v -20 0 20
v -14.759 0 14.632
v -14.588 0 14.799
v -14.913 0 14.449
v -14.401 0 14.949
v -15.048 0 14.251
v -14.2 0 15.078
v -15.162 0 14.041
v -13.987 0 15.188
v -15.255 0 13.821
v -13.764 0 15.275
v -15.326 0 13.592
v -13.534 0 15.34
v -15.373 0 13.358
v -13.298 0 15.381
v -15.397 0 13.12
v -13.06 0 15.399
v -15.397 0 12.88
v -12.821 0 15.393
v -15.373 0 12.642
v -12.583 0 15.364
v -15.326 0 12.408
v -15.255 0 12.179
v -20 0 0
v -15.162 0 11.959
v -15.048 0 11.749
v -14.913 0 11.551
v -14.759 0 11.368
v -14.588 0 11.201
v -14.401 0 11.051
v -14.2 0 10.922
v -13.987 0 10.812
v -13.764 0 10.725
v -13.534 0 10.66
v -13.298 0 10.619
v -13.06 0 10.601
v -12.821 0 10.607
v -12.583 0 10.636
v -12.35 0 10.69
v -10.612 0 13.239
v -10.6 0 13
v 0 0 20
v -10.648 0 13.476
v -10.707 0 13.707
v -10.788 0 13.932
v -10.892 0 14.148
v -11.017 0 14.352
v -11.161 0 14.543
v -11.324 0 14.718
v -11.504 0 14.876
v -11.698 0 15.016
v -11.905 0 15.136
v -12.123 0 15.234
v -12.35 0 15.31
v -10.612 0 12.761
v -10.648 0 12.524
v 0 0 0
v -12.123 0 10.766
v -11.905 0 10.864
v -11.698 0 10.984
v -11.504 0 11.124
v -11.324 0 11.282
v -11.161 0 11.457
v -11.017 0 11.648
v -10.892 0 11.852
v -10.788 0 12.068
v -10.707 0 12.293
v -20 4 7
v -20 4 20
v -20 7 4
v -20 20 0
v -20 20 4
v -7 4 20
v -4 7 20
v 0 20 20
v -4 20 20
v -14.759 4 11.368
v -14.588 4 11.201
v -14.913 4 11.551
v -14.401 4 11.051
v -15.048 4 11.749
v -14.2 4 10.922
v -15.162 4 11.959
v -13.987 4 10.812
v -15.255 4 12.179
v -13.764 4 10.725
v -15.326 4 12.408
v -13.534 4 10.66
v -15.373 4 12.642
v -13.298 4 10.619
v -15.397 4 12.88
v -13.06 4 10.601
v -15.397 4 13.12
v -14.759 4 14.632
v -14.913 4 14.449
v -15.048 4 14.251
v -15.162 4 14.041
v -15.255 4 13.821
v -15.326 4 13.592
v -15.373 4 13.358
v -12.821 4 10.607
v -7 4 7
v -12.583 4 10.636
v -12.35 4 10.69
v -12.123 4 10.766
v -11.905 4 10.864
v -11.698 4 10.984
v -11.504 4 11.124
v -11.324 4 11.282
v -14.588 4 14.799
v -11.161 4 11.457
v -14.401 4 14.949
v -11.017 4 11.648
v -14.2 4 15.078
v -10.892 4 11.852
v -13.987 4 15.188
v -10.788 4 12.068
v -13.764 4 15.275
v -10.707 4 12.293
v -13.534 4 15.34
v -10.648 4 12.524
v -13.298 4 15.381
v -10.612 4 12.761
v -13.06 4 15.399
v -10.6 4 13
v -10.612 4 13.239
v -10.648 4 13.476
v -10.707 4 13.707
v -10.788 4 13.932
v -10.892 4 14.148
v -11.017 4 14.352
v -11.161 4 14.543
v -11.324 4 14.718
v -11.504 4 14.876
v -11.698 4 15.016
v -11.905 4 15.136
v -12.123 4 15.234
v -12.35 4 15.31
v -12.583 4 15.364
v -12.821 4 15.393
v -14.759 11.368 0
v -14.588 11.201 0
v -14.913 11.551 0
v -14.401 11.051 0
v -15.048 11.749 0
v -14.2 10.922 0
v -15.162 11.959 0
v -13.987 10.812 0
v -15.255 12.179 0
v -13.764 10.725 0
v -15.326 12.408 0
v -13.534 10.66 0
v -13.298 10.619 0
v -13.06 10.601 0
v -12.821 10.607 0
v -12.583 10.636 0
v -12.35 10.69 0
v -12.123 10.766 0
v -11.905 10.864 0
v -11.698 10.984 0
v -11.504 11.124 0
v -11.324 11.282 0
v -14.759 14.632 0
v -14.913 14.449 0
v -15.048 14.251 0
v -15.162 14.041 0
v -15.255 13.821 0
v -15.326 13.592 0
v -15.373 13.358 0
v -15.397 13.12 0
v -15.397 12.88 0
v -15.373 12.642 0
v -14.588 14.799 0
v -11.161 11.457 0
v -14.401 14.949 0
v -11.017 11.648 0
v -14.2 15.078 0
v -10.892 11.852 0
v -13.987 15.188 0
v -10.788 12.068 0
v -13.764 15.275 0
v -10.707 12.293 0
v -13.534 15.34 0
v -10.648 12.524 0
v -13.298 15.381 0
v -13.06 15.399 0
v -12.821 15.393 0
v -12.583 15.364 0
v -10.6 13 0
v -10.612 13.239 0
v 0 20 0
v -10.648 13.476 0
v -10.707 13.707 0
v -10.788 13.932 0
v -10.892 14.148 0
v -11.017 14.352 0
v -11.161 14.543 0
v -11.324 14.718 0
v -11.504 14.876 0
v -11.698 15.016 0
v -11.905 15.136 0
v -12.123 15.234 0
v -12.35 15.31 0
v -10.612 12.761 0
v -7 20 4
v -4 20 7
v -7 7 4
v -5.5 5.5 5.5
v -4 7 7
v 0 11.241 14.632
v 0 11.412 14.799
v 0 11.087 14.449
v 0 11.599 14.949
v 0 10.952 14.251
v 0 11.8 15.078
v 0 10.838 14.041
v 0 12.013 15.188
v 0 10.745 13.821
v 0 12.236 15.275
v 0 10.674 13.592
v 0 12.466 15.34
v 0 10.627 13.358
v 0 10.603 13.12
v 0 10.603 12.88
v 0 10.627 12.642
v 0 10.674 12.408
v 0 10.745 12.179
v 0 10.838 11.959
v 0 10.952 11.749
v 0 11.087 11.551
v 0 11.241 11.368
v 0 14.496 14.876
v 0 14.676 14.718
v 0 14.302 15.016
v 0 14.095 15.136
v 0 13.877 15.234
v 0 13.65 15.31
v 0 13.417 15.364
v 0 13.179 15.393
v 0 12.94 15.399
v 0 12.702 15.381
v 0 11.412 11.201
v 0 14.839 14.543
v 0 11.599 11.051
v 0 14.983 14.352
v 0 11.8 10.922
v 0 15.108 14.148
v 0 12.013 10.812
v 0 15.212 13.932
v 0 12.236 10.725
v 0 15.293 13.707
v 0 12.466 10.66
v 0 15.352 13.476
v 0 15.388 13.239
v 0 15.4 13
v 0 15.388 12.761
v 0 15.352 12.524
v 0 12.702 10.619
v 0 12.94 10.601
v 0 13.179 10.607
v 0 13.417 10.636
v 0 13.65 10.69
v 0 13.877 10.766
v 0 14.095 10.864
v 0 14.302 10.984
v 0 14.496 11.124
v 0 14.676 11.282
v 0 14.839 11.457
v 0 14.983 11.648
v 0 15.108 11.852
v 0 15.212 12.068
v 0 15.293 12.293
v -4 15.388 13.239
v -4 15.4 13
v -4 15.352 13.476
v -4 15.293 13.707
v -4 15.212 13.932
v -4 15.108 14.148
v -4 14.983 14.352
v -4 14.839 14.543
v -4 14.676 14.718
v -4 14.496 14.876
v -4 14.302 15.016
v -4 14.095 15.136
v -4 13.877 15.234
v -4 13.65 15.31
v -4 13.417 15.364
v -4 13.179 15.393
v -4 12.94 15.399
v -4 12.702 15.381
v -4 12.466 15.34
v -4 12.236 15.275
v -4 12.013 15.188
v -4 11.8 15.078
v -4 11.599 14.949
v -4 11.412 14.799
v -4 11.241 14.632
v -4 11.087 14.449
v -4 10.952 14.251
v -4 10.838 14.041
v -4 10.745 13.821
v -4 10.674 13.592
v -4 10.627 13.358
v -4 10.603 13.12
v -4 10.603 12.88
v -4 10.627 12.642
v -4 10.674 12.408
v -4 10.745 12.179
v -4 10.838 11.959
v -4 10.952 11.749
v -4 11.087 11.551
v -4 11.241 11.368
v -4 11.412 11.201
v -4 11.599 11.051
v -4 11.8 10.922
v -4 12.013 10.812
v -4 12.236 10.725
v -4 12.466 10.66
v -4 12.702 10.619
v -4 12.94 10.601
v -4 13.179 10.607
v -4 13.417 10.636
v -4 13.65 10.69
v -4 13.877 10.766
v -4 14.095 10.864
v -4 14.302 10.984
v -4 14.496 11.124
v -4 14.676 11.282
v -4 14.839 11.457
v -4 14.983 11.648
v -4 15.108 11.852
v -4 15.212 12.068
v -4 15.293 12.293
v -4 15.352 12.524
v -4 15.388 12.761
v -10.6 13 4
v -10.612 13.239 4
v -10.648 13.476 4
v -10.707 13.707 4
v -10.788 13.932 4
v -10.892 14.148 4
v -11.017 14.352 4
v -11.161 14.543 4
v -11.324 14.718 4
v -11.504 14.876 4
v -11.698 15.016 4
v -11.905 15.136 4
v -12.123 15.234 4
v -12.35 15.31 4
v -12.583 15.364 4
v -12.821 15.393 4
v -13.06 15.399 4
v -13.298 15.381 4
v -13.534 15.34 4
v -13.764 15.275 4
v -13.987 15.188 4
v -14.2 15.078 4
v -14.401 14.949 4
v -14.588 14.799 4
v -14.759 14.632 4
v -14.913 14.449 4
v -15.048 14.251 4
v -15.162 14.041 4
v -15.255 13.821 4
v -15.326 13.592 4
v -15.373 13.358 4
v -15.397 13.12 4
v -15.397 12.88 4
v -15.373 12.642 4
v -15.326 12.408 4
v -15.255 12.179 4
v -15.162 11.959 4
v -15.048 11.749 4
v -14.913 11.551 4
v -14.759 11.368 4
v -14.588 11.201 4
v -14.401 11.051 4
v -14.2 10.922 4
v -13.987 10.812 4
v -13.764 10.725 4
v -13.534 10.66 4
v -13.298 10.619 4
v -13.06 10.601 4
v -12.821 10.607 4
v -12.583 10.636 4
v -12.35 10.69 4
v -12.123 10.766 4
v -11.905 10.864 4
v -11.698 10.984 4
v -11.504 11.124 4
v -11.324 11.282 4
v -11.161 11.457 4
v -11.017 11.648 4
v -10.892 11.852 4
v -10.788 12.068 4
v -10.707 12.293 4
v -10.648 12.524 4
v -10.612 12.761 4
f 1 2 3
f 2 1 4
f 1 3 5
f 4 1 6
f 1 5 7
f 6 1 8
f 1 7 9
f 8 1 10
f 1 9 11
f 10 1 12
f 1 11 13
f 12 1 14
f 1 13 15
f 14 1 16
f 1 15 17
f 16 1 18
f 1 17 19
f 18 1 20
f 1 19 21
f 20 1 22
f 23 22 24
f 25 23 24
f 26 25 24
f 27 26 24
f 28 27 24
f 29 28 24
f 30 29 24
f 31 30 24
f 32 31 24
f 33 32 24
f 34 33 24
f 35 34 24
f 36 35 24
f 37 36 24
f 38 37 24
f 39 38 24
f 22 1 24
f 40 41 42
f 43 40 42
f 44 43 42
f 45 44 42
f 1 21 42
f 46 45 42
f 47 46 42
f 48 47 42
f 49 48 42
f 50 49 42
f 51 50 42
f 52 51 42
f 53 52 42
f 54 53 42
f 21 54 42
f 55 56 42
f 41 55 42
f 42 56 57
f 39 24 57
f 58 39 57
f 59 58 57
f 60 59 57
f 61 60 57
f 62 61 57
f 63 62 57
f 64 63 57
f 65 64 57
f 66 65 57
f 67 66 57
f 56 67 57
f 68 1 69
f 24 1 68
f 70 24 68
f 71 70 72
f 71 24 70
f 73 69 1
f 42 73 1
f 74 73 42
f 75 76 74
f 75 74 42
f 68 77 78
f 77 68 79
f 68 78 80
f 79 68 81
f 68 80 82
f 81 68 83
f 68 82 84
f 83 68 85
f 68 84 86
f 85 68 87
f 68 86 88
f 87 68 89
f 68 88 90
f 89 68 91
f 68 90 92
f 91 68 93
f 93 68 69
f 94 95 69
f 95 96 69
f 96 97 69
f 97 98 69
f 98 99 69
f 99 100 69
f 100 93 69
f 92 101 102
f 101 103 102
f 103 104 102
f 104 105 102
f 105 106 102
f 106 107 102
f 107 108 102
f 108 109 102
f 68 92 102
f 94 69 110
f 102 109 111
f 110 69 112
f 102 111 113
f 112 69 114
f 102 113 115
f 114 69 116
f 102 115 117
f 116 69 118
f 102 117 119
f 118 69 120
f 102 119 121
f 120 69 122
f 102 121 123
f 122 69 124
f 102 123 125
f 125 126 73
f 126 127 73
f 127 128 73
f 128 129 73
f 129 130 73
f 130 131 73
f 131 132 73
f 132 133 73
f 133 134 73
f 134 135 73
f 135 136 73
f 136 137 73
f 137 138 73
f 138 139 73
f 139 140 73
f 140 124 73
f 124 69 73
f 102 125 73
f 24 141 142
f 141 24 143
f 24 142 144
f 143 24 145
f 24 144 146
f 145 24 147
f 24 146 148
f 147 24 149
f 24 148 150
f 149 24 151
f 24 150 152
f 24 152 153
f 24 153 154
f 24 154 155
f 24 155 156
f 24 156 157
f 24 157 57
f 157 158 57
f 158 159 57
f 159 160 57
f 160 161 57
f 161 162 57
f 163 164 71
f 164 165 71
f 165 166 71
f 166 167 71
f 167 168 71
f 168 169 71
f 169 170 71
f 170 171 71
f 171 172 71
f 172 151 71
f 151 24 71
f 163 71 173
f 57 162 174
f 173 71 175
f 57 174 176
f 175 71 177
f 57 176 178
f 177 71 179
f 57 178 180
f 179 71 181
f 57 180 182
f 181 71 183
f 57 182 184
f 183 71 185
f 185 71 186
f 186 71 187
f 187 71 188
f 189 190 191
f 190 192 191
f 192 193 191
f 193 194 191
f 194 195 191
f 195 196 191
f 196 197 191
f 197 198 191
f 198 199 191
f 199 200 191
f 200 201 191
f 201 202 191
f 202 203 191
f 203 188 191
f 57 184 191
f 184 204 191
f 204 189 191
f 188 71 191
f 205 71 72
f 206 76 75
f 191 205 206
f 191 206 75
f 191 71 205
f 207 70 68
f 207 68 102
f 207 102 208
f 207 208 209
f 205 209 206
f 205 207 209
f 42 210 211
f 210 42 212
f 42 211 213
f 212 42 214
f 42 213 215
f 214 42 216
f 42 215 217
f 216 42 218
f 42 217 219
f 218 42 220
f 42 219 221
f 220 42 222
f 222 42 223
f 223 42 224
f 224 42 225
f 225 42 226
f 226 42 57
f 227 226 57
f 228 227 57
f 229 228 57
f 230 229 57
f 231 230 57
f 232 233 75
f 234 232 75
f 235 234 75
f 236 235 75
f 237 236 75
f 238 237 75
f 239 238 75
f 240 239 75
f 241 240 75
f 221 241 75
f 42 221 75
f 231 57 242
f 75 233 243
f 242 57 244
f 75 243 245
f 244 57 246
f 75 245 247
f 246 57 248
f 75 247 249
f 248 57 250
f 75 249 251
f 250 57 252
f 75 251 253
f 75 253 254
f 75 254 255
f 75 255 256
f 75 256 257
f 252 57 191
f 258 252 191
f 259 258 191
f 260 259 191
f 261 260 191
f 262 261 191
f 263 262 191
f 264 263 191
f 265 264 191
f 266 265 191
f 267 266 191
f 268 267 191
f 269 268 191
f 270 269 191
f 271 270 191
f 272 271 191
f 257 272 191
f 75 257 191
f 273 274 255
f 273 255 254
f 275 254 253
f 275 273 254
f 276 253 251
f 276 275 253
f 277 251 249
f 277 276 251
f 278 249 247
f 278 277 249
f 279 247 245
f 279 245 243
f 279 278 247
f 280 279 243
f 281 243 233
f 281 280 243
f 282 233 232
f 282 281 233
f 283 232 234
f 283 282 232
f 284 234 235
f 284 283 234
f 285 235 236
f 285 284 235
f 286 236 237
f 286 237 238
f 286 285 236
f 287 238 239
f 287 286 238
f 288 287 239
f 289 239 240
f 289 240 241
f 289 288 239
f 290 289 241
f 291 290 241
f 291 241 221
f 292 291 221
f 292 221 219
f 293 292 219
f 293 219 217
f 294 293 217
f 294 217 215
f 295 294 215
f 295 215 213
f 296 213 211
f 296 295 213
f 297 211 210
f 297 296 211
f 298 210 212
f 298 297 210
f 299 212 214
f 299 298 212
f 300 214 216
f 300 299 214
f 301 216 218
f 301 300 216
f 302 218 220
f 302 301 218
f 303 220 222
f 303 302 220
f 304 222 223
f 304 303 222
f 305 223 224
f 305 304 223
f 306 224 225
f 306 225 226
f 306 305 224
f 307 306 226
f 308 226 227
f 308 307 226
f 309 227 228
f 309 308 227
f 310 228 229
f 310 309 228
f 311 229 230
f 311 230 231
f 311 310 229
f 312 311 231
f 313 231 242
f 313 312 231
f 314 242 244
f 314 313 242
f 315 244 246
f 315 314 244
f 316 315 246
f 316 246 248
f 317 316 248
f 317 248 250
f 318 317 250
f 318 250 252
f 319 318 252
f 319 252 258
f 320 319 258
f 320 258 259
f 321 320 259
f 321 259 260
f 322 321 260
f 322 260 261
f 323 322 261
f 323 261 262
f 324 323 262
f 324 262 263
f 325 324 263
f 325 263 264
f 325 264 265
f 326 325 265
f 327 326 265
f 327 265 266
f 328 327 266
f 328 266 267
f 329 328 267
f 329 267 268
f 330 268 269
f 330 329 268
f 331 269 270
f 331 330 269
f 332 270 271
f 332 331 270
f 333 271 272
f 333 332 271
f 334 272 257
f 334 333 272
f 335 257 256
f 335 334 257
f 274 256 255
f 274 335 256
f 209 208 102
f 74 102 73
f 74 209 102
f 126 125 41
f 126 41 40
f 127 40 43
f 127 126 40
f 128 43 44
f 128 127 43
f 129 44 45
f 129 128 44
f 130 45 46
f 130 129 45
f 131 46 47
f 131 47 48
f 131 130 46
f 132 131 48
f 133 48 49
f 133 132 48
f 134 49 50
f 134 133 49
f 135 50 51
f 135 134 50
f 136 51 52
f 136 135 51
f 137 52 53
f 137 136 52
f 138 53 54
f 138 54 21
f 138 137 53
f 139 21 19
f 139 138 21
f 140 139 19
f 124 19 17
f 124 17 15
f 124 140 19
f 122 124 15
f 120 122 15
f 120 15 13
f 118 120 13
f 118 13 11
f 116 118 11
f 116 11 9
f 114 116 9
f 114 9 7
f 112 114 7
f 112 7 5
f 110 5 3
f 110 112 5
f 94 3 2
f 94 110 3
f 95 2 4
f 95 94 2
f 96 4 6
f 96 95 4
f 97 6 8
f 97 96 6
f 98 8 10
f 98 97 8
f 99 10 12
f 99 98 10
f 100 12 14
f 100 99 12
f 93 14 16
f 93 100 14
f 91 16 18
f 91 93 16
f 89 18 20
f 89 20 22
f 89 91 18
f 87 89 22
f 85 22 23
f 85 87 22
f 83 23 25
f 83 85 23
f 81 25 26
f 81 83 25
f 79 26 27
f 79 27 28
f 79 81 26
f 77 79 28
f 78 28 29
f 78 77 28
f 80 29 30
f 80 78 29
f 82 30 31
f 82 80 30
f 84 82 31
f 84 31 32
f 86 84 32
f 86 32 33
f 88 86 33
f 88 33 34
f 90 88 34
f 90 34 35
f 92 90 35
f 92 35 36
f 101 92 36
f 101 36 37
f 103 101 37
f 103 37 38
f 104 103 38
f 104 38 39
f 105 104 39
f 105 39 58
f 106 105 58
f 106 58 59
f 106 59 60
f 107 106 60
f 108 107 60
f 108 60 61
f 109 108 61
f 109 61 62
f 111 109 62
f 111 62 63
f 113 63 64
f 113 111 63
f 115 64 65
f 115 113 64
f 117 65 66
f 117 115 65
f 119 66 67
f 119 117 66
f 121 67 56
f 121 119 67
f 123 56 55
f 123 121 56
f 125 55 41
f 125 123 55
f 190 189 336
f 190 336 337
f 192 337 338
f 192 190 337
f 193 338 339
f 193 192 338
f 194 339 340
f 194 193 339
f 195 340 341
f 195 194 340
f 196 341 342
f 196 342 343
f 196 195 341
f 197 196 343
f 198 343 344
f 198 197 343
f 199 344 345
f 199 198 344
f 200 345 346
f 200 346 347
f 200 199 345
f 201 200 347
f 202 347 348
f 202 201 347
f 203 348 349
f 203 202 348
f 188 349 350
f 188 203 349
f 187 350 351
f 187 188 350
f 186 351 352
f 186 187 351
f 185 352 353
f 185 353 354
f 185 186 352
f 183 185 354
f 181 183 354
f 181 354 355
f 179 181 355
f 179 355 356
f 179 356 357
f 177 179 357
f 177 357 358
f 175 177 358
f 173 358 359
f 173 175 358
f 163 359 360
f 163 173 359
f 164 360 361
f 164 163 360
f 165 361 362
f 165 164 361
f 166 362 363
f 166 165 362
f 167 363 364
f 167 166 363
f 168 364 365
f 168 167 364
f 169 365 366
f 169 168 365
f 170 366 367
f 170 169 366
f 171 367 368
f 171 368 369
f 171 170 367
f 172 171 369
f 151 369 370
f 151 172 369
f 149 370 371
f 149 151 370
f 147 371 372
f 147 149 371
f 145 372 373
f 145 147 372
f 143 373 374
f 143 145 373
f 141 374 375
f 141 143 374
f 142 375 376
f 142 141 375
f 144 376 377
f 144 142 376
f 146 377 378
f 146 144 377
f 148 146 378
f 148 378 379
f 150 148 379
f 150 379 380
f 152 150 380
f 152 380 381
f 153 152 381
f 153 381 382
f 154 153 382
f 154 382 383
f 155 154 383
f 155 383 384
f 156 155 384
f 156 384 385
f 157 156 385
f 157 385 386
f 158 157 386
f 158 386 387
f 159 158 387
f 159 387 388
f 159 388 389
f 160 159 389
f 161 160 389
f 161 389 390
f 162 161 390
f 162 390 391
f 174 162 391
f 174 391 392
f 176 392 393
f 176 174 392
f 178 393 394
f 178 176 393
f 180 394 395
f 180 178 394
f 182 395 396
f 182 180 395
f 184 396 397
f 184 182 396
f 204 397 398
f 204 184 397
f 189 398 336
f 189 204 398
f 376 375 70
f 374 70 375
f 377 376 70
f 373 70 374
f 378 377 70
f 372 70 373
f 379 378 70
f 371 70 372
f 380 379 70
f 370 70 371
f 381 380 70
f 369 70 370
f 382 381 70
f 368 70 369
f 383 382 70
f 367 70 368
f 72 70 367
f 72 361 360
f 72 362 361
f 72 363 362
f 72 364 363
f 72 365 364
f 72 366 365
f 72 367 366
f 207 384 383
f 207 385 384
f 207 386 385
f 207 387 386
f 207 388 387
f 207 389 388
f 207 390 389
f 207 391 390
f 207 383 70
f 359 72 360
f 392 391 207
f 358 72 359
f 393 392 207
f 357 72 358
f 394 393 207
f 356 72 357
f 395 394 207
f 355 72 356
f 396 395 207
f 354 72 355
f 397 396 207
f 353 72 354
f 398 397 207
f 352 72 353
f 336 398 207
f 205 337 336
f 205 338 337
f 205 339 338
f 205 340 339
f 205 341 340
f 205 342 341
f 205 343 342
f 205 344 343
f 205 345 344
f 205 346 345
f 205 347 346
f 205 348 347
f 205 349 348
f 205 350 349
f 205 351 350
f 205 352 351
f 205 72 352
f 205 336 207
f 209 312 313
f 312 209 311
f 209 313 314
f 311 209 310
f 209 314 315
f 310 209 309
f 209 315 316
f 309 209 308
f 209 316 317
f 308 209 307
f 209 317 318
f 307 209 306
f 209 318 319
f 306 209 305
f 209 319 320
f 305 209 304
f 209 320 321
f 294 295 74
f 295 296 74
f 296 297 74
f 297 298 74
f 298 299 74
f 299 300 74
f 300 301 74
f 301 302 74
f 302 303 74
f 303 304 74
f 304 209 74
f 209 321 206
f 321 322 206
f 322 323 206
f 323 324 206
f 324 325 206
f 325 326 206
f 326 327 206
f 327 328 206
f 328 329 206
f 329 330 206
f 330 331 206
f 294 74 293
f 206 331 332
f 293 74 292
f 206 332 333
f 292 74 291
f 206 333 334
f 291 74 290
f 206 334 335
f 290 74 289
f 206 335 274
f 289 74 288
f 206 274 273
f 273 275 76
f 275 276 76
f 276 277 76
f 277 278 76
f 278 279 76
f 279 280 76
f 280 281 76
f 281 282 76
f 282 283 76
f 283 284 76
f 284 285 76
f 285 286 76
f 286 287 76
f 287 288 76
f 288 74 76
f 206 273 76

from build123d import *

# Parameters (mm, degrees)
SKETCH001_W     = 20
SKETCH001_H     = 20
SKETCH001_R     = 2.4
PAD001_DEPTH    = 4
SKETCH002_W     = 20
SKETCH002_H     = 20
SKETCH002_R     = 2.4
PAD002_DEPTH    = 4
SKETCH_W        = 20
SKETCH_H        = 20
SKETCH_R        = 2.4
PAD_DEPTH       = 4
CHAMFER_SIZE    = 3
CHAMFER001_SIZE = 3
CHAMFER002_SIZE = 3


with BuildPart() as pad001:
    # Sketch001 → Pad001 (new body)
    with BuildSketch(Plane.XZ.offset(-4)):
        with Locations((-10, 10)):
            Rectangle(SKETCH001_W, SKETCH001_H)
        with Locations((-13, 13)):
            Circle(SKETCH001_R, mode=Mode.SUBTRACT)
    extrude(amount=PAD001_DEPTH)


with BuildPart() as pad002:
    # Sketch002 → Pad002 (new body)
    with BuildSketch(Plane.YZ.offset(-4)):
        with Locations((10, 10)):
            Rectangle(SKETCH002_W, SKETCH002_H)
        with Locations((13, 13)):
            Circle(SKETCH002_R, mode=Mode.SUBTRACT)
    extrude(amount=PAD002_DEPTH)


with BuildPart() as chamfer002:
    # Sketch → Pad (new body)
    with BuildSketch(Plane.XY):
        with Locations((-10, 10)):
            Rectangle(SKETCH_W, SKETCH_H)
        with Locations((-13, 13)):
            Circle(SKETCH_R, mode=Mode.SUBTRACT)
    extrude(amount=PAD_DEPTH)

    # Fusion: union Pad001, Pad002
    add(pad001.part)
    add(pad002.part)

    # Chamfer
    chamfer_edges = [chamfer002.edges().sort_by_distance(p)[0] for p in [
        (-4, 4, 12),
    ]]
    chamfer(chamfer_edges, length=CHAMFER_SIZE)

    # Chamfer001
    chamfer001_edges = [chamfer002.edges().sort_by_distance(p)[0] for p in [
        (-13.5, 4, 4),
    ]]
    chamfer(chamfer001_edges, length=CHAMFER001_SIZE)

    # Chamfer002
    chamfer002_edges = [chamfer002.edges().sort_by_distance(p)[0] for p in [
        (-4, 13.5, 4),
    ]]
    chamfer(chamfer002_edges, length=CHAMFER002_SIZE)


solid = chamfer002.part
